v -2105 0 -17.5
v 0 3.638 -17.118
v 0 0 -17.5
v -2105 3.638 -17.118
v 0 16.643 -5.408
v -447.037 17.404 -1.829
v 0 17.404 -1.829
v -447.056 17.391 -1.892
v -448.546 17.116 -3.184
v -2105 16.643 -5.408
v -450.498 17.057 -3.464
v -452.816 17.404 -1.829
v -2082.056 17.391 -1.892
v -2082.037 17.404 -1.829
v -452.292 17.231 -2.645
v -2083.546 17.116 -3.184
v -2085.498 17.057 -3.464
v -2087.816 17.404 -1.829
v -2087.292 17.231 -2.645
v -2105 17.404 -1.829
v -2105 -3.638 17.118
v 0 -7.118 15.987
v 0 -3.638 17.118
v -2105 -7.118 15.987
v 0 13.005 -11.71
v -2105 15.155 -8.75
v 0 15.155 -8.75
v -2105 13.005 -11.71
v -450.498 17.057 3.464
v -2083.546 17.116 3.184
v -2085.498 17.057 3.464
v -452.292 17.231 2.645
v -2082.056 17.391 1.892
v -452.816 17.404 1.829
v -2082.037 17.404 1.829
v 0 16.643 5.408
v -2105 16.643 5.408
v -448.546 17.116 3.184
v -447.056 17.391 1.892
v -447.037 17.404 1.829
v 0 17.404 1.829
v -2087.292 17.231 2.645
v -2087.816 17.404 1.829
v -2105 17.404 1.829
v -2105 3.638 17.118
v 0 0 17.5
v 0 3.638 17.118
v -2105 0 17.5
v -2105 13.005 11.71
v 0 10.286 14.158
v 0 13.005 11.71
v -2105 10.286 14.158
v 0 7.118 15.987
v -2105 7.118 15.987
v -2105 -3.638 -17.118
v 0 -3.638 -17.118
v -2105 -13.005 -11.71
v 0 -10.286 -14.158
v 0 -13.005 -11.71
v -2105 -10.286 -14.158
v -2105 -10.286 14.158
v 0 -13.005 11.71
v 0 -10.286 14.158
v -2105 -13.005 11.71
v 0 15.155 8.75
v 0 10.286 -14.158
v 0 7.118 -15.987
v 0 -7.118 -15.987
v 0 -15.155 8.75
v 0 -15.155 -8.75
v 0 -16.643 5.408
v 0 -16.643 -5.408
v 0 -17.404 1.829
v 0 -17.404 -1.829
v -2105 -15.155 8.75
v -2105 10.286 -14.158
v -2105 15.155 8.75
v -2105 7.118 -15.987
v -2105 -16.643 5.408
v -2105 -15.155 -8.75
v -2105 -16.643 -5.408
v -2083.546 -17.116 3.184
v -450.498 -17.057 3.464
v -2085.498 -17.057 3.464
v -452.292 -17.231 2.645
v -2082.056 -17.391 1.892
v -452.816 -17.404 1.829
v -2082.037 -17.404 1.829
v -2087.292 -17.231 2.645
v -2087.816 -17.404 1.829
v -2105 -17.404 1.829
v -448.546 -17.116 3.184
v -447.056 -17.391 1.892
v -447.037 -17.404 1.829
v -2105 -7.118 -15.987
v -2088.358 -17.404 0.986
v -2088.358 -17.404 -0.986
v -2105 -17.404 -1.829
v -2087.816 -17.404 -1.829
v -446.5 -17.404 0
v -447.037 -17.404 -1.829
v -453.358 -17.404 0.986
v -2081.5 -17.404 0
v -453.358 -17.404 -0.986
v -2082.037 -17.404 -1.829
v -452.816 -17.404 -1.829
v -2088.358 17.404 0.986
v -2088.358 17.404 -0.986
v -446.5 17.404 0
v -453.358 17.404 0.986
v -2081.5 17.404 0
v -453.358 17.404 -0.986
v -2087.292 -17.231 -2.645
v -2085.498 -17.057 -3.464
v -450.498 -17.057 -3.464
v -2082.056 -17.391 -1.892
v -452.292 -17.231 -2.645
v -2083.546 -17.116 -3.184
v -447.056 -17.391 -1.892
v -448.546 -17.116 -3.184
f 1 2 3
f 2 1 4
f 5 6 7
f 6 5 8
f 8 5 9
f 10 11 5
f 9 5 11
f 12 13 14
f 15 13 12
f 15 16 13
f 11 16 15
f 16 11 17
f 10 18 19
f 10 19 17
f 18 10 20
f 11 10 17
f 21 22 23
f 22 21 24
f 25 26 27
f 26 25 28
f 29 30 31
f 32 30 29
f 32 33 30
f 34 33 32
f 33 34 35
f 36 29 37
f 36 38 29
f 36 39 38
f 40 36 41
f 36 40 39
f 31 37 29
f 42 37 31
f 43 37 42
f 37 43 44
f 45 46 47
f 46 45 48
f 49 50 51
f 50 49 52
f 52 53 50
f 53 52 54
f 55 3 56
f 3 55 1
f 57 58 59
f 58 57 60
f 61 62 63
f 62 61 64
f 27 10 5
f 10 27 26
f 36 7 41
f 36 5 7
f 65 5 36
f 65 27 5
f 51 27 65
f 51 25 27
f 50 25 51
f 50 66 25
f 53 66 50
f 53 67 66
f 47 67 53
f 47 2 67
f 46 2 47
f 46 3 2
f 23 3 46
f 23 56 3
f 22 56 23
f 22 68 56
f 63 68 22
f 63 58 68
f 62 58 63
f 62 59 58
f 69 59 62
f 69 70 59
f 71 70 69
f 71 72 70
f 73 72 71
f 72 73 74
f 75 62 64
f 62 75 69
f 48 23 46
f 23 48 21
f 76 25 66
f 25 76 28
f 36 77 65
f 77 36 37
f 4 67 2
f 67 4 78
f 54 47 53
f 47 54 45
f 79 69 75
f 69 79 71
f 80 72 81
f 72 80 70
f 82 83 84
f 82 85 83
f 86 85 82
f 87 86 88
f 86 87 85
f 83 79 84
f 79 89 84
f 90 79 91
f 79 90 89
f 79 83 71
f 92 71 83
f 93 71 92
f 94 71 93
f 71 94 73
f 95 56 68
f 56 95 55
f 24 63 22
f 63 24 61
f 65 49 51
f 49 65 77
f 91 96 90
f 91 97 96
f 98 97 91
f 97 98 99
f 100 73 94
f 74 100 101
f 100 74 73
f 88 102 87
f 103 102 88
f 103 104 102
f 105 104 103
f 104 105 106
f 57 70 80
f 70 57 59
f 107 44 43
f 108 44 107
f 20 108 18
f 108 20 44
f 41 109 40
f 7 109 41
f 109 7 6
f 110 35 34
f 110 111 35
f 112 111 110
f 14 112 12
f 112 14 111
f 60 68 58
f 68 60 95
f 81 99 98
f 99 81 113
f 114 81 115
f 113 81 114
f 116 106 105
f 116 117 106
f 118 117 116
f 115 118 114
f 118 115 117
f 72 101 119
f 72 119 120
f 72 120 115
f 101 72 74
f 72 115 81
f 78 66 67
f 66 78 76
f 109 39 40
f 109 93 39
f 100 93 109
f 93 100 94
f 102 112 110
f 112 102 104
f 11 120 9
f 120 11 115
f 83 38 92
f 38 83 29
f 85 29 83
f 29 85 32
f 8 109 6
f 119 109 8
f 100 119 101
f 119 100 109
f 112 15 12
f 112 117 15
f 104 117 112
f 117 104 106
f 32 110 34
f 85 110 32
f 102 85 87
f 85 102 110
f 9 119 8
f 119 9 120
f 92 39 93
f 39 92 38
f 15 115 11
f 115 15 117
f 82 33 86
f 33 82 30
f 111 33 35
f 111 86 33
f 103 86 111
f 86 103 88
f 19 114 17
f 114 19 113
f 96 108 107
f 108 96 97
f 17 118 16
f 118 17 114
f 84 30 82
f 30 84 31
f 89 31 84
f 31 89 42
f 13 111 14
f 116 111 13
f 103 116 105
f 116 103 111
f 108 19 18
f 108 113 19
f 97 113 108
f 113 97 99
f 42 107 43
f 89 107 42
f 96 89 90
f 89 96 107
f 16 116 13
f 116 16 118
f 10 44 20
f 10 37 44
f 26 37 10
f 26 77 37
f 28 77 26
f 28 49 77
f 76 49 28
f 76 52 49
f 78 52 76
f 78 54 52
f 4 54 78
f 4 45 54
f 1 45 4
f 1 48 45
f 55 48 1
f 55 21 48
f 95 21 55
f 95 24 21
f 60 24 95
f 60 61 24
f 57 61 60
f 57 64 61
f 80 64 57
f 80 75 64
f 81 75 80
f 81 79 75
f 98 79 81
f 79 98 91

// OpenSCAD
StringerZadVnesh();

stringerR = 35/2;
length = 2100;
probkaThk = 5;
shpHoleR = 7/2;
//b1 = 15;
//b2 = 435;
b3 = 450;
b4 = 2100 - 15;

module StringerZadVnesh() {

    color([1,0,0]) 
    translate([-length,0,0])
    rotate([0,-90,0]) 
    cylinder(h=probkaThk, r=stringerR);

    difference() {

        rotate([0,-90,0]) 
        cylinder(h=length, r=stringerR);

        translate([-b3,0,0])
        rotate([90,0,0]) 
        cylinder(h=2*stringerR+2,r=shpHoleR, center=true);

        translate([-b4,0,0]) 
        rotate([90,0,0]) 
        cylinder(h=2*stringerR+2,r=shpHoleR, center=true);

    }
}
